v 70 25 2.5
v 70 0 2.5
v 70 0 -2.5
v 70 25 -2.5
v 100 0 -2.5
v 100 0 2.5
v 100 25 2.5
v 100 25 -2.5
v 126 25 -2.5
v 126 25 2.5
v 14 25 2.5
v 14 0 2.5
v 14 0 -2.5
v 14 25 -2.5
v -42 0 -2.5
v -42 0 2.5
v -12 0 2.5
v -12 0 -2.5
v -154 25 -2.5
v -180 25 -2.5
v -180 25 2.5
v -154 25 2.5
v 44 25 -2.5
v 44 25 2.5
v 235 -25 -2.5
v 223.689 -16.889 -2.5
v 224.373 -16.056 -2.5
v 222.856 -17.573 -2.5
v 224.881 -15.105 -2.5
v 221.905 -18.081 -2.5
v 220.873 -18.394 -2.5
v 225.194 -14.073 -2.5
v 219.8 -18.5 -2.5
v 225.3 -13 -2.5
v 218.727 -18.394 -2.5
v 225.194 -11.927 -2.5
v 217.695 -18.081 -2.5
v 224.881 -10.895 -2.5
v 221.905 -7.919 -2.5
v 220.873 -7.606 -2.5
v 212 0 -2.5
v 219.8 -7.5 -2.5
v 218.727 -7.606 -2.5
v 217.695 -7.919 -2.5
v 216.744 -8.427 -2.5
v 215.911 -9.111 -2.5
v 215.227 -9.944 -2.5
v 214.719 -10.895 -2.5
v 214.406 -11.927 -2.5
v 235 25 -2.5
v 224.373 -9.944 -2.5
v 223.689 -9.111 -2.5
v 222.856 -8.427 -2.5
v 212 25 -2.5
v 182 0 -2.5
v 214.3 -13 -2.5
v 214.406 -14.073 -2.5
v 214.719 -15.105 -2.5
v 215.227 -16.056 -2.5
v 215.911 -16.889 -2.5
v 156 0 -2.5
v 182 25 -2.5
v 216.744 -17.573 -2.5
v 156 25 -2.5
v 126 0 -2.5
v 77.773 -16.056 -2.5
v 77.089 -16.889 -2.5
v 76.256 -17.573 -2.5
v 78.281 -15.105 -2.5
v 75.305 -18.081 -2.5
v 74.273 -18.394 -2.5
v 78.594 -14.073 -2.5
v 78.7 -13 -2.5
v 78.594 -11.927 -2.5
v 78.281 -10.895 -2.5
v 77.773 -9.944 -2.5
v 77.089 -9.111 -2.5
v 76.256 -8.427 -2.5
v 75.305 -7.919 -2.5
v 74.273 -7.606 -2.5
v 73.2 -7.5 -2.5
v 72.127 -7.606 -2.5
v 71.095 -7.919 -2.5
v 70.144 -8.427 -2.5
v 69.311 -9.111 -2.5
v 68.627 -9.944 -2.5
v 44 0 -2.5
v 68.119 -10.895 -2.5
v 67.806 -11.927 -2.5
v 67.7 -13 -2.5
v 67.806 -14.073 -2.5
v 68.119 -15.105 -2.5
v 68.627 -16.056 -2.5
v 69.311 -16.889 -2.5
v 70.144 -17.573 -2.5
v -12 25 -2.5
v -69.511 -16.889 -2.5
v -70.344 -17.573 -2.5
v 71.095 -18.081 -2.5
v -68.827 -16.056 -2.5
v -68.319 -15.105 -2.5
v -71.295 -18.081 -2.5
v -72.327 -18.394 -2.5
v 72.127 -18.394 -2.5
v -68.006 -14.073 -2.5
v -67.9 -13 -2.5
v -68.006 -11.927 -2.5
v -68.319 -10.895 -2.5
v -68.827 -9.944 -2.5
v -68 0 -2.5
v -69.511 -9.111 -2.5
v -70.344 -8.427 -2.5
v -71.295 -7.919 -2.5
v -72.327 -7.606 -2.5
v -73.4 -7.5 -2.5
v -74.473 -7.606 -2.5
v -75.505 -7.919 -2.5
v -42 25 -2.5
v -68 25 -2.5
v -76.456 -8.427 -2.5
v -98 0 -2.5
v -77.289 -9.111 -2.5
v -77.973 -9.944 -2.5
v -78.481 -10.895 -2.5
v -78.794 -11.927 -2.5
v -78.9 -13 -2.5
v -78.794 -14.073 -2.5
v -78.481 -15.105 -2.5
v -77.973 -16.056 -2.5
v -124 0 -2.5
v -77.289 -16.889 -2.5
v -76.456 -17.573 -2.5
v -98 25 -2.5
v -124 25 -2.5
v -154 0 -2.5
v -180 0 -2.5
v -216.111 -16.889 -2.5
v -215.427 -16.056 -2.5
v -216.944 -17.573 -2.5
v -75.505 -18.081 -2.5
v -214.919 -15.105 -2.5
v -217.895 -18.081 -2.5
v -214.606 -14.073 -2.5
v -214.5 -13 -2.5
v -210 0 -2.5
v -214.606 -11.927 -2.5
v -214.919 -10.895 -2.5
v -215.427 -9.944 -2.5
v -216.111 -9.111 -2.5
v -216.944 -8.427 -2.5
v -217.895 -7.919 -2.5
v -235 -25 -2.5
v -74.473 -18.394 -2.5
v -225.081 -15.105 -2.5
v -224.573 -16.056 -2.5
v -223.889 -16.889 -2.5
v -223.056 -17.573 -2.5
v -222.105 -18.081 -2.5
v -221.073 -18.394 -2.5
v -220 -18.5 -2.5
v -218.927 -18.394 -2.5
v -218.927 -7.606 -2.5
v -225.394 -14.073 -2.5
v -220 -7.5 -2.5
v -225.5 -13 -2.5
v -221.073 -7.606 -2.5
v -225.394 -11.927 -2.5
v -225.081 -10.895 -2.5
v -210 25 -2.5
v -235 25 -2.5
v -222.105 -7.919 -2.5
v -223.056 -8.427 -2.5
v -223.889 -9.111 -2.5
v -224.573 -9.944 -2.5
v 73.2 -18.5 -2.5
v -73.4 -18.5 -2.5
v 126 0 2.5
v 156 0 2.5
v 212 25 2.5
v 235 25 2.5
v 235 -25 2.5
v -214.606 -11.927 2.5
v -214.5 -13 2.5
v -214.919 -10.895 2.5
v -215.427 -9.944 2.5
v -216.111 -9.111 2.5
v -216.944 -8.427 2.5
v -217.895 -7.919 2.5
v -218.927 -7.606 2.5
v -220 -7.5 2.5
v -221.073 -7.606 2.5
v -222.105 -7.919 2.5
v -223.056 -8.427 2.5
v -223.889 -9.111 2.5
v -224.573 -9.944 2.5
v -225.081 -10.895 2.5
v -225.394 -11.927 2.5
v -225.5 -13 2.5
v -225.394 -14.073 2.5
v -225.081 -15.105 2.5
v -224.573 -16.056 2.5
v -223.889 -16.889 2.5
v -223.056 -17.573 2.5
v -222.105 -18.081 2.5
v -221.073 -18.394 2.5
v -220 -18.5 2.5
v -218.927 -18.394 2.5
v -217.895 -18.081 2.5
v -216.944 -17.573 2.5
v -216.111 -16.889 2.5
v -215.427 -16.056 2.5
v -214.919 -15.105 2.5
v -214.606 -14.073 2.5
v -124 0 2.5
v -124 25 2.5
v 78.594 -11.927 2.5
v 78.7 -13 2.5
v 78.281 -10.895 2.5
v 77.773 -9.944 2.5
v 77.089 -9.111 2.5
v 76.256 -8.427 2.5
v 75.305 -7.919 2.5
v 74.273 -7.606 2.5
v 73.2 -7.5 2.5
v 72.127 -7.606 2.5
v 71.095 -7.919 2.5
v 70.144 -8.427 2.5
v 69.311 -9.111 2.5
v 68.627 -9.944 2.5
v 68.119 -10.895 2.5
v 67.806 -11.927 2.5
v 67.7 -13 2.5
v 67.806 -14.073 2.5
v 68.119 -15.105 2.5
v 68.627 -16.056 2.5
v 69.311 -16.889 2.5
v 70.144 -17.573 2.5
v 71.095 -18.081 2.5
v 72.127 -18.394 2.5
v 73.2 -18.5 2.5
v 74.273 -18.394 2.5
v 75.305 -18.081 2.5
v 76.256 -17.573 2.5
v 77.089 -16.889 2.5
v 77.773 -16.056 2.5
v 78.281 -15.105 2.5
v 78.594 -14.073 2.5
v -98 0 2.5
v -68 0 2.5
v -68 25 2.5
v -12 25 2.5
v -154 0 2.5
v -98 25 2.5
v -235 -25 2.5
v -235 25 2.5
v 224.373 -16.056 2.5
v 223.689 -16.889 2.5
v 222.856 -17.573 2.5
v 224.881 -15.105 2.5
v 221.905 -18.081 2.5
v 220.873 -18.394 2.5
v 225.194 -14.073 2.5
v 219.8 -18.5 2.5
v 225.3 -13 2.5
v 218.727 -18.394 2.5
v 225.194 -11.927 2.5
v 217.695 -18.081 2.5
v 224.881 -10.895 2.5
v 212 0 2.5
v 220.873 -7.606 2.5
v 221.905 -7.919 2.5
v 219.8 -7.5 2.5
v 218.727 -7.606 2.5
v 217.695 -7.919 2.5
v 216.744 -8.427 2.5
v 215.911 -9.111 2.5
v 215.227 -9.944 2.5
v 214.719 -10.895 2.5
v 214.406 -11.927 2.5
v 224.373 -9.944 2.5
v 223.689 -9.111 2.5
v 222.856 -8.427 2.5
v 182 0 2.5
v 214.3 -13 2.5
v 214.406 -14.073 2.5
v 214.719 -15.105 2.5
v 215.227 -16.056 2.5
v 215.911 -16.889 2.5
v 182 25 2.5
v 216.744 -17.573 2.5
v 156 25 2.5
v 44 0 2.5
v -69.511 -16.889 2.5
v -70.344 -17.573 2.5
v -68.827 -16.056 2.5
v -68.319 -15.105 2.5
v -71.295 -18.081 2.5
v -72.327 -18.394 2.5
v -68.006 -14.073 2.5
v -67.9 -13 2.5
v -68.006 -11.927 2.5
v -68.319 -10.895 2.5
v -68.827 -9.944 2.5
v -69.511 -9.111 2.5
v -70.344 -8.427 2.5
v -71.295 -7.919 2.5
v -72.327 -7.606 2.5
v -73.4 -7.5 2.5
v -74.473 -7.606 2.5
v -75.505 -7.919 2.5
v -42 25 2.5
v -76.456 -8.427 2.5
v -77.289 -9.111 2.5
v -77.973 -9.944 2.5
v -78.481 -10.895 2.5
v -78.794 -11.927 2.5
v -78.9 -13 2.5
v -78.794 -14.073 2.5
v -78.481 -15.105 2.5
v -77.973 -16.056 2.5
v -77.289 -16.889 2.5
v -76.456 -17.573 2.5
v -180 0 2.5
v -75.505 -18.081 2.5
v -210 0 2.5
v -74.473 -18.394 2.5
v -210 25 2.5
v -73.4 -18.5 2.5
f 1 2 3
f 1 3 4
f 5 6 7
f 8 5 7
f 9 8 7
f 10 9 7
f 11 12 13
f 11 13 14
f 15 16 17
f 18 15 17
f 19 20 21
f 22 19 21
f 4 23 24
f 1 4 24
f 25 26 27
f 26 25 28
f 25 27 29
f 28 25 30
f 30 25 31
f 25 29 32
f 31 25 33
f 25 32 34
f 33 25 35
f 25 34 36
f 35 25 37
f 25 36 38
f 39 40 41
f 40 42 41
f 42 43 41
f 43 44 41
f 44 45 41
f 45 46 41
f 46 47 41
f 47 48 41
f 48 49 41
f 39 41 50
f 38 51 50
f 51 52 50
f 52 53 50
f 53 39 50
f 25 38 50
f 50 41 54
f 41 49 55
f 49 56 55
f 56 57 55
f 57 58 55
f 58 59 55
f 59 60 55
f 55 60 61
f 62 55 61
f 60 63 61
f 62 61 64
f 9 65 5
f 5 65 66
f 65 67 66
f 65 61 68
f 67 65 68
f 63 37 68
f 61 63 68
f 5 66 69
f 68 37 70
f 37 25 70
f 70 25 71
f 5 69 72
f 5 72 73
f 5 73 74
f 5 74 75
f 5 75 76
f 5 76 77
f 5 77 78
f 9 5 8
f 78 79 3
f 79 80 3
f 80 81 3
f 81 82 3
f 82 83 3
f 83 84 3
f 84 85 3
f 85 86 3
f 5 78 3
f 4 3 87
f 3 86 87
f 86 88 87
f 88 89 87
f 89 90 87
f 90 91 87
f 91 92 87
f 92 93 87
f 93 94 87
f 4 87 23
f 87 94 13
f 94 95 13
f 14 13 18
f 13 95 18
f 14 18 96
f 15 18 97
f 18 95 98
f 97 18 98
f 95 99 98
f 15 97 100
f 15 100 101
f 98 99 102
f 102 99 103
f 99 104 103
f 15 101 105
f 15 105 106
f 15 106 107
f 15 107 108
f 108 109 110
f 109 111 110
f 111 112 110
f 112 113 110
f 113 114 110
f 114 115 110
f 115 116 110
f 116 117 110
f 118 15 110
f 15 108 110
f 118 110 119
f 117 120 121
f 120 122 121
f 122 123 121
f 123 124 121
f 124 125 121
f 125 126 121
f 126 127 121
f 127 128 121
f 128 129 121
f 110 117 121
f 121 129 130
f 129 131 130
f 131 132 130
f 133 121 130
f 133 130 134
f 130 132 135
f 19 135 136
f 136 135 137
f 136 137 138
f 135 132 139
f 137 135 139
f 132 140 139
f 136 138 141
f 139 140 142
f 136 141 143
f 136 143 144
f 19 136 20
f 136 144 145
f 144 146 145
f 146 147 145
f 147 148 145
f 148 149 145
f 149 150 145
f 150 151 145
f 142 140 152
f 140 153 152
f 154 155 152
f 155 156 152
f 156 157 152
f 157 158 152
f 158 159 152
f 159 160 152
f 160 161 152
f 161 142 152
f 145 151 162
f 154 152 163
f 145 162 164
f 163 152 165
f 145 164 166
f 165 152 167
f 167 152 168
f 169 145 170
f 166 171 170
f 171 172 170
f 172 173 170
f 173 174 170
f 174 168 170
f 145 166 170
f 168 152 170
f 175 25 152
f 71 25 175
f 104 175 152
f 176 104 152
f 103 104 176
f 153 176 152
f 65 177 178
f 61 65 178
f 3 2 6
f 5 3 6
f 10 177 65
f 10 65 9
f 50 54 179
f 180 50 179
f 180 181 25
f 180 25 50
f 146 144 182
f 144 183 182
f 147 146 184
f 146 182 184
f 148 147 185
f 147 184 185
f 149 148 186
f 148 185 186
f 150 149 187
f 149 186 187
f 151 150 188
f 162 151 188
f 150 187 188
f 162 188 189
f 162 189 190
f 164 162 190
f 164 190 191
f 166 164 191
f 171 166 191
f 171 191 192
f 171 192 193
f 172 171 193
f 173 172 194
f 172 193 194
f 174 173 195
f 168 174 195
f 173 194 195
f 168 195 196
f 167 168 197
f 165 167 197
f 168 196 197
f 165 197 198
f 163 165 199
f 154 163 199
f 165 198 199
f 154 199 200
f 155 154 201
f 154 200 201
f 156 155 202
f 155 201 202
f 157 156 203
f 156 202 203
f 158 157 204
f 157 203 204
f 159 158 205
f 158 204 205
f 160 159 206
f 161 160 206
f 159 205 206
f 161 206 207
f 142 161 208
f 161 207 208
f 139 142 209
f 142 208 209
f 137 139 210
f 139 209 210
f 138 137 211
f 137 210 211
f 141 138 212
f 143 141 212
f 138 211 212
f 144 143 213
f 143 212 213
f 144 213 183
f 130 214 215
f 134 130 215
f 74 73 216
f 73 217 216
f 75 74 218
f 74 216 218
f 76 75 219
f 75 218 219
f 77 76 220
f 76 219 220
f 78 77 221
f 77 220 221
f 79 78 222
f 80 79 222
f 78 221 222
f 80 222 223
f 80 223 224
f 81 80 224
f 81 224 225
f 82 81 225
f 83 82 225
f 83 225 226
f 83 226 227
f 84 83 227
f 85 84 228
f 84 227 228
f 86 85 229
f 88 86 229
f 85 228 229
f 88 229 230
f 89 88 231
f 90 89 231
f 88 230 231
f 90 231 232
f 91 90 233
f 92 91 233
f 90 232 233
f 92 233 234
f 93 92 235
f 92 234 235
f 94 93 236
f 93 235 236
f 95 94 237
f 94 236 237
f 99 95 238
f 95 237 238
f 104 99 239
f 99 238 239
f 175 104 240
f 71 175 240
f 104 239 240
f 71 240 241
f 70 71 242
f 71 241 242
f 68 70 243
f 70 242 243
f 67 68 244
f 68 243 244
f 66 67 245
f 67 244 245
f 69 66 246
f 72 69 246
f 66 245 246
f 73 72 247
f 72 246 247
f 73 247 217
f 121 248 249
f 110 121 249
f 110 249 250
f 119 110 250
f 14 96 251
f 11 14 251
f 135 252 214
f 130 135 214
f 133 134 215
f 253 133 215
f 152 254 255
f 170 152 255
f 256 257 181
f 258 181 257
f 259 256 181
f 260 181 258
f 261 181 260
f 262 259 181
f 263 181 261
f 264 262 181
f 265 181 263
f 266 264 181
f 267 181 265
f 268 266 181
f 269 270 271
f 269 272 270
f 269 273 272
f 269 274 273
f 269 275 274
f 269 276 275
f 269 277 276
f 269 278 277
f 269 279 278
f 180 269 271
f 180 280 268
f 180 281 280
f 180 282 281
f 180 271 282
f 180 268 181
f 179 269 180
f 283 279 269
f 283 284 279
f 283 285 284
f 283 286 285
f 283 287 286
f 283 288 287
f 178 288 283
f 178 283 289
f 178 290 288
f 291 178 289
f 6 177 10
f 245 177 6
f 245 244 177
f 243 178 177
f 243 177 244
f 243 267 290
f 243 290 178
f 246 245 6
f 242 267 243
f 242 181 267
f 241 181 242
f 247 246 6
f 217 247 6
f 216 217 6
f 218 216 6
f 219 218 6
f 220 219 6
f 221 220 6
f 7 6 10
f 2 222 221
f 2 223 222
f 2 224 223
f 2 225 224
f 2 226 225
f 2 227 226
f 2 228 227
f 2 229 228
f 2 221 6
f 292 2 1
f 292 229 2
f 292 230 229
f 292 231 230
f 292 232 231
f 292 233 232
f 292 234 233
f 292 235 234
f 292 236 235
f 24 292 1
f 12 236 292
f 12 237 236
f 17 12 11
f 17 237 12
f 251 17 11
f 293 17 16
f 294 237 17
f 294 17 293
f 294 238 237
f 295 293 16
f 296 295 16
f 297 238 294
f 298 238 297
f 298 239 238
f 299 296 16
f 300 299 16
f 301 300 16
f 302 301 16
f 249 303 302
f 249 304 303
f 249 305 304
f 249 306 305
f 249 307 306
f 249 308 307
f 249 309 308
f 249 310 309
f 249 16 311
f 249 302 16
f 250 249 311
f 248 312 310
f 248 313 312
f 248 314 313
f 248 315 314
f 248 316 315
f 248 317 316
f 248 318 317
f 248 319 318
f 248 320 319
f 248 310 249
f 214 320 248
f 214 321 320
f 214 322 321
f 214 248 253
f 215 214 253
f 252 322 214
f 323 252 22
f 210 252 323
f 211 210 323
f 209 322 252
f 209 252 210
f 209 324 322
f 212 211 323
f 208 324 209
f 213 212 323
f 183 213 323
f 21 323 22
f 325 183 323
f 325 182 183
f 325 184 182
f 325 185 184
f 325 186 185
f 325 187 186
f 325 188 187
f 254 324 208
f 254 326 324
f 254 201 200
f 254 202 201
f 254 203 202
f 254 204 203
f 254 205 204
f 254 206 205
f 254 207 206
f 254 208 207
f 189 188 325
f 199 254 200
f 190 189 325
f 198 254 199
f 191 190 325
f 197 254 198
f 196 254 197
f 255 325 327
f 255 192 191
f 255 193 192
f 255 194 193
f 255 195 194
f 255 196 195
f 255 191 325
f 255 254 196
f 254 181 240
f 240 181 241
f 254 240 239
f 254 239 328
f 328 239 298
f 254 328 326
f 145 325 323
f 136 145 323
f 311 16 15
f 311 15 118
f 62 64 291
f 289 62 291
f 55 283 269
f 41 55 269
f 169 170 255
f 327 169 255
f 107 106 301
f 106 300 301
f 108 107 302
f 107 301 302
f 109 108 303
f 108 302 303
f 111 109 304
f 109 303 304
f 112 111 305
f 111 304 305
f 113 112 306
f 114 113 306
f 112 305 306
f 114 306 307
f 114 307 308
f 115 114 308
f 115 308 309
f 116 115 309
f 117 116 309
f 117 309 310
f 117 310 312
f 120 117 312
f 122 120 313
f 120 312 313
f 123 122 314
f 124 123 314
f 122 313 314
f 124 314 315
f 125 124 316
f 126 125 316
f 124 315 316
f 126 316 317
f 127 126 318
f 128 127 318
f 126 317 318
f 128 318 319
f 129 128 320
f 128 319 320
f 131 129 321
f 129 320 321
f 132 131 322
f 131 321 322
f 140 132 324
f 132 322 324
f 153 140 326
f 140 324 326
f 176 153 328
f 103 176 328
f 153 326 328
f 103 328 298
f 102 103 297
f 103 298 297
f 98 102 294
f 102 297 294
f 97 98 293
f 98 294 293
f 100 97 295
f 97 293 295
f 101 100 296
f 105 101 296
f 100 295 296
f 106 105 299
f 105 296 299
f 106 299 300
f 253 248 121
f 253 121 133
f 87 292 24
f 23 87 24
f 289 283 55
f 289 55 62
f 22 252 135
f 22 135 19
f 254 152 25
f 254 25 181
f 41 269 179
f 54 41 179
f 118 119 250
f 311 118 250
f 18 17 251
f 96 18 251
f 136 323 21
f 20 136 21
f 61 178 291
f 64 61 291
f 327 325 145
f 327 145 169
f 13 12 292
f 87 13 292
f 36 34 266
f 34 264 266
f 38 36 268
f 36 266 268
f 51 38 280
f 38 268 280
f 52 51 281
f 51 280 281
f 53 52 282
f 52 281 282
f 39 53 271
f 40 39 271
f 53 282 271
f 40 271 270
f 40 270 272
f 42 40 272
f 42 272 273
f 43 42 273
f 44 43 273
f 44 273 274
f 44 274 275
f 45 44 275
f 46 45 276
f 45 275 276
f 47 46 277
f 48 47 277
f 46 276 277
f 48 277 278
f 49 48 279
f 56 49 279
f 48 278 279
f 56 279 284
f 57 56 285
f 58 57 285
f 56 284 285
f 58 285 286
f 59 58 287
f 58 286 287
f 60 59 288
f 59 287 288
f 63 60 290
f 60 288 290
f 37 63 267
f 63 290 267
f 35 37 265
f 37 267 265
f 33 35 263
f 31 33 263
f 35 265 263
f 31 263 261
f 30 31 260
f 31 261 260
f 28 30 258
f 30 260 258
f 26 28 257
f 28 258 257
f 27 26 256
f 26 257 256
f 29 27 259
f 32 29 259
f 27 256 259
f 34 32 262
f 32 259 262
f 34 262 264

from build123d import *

# Parameters (mm, degrees)
PLAT_W                      = 50
PLAT_H                      = 5
EL_MENT_M_CANO_SOUD_1_DEPTH = 470
ESQUISSE7_W                 = 30
ESQUISSE7_H                 = 25
ENL_V_MAT_EXTRU_2_DEPTH     = 6
R_P_TITION_LIN_AIRE2_COUNT  = 8
R_P_TITION_LIN_AIRE2_PITCH  = 56
ESQUISSE8_R                 = 5.5
ENL_V_MAT_EXTRU_3_DEPTH     = 5
R_P_TITION_LIN_AIRE3_COUNT  = 4
R_P_TITION_LIN_AIRE3_PITCH  = 146.6


with BuildPart() as part:
    # plat → Elément mécano-soudé1 (new body)
    with BuildSketch(Plane.YZ.offset(-235)):
        Rectangle(PLAT_W, PLAT_H)
    extrude(amount=EL_MENT_M_CANO_SOUD_1_DEPTH)

    # Esquisse7 → Enlèv. mat.-Extru.2 (cut, through all)
    with BuildSketch(Plane.XY.offset(2.5)):
        with Locations((-195, 12.5)):
            Rectangle(ESQUISSE7_W, ESQUISSE7_H)
    enl_v_mat_extru_2 = extrude(amount=-ENL_V_MAT_EXTRU_2_DEPTH, mode=Mode.SUBTRACT)

    # Répétition linéaire2: Enlèv. mat.-Extru.2 ×8
    with Locations(*[(i * R_P_TITION_LIN_AIRE2_PITCH, 0, 0) for i in range(1, R_P_TITION_LIN_AIRE2_COUNT)]):
        add(enl_v_mat_extru_2, mode=Mode.SUBTRACT)

    # Esquisse8 → Enlèv. mat.-Extru.3 (cut, symmetric)
    with BuildSketch(Plane.XY):
        with Locations((-220, -13)):
            Circle(ESQUISSE8_R)
    enl_v_mat_extru_3 = extrude(amount=ENL_V_MAT_EXTRU_3_DEPTH, both=True, mode=Mode.SUBTRACT)

    # Répétition linéaire3: Enlèv. mat.-Extru.3 ×4
    with Locations(*[(i * R_P_TITION_LIN_AIRE3_PITCH, 0, 0) for i in range(1, R_P_TITION_LIN_AIRE3_COUNT)]):
        add(enl_v_mat_extru_3, mode=Mode.SUBTRACT)


solid = part.part
